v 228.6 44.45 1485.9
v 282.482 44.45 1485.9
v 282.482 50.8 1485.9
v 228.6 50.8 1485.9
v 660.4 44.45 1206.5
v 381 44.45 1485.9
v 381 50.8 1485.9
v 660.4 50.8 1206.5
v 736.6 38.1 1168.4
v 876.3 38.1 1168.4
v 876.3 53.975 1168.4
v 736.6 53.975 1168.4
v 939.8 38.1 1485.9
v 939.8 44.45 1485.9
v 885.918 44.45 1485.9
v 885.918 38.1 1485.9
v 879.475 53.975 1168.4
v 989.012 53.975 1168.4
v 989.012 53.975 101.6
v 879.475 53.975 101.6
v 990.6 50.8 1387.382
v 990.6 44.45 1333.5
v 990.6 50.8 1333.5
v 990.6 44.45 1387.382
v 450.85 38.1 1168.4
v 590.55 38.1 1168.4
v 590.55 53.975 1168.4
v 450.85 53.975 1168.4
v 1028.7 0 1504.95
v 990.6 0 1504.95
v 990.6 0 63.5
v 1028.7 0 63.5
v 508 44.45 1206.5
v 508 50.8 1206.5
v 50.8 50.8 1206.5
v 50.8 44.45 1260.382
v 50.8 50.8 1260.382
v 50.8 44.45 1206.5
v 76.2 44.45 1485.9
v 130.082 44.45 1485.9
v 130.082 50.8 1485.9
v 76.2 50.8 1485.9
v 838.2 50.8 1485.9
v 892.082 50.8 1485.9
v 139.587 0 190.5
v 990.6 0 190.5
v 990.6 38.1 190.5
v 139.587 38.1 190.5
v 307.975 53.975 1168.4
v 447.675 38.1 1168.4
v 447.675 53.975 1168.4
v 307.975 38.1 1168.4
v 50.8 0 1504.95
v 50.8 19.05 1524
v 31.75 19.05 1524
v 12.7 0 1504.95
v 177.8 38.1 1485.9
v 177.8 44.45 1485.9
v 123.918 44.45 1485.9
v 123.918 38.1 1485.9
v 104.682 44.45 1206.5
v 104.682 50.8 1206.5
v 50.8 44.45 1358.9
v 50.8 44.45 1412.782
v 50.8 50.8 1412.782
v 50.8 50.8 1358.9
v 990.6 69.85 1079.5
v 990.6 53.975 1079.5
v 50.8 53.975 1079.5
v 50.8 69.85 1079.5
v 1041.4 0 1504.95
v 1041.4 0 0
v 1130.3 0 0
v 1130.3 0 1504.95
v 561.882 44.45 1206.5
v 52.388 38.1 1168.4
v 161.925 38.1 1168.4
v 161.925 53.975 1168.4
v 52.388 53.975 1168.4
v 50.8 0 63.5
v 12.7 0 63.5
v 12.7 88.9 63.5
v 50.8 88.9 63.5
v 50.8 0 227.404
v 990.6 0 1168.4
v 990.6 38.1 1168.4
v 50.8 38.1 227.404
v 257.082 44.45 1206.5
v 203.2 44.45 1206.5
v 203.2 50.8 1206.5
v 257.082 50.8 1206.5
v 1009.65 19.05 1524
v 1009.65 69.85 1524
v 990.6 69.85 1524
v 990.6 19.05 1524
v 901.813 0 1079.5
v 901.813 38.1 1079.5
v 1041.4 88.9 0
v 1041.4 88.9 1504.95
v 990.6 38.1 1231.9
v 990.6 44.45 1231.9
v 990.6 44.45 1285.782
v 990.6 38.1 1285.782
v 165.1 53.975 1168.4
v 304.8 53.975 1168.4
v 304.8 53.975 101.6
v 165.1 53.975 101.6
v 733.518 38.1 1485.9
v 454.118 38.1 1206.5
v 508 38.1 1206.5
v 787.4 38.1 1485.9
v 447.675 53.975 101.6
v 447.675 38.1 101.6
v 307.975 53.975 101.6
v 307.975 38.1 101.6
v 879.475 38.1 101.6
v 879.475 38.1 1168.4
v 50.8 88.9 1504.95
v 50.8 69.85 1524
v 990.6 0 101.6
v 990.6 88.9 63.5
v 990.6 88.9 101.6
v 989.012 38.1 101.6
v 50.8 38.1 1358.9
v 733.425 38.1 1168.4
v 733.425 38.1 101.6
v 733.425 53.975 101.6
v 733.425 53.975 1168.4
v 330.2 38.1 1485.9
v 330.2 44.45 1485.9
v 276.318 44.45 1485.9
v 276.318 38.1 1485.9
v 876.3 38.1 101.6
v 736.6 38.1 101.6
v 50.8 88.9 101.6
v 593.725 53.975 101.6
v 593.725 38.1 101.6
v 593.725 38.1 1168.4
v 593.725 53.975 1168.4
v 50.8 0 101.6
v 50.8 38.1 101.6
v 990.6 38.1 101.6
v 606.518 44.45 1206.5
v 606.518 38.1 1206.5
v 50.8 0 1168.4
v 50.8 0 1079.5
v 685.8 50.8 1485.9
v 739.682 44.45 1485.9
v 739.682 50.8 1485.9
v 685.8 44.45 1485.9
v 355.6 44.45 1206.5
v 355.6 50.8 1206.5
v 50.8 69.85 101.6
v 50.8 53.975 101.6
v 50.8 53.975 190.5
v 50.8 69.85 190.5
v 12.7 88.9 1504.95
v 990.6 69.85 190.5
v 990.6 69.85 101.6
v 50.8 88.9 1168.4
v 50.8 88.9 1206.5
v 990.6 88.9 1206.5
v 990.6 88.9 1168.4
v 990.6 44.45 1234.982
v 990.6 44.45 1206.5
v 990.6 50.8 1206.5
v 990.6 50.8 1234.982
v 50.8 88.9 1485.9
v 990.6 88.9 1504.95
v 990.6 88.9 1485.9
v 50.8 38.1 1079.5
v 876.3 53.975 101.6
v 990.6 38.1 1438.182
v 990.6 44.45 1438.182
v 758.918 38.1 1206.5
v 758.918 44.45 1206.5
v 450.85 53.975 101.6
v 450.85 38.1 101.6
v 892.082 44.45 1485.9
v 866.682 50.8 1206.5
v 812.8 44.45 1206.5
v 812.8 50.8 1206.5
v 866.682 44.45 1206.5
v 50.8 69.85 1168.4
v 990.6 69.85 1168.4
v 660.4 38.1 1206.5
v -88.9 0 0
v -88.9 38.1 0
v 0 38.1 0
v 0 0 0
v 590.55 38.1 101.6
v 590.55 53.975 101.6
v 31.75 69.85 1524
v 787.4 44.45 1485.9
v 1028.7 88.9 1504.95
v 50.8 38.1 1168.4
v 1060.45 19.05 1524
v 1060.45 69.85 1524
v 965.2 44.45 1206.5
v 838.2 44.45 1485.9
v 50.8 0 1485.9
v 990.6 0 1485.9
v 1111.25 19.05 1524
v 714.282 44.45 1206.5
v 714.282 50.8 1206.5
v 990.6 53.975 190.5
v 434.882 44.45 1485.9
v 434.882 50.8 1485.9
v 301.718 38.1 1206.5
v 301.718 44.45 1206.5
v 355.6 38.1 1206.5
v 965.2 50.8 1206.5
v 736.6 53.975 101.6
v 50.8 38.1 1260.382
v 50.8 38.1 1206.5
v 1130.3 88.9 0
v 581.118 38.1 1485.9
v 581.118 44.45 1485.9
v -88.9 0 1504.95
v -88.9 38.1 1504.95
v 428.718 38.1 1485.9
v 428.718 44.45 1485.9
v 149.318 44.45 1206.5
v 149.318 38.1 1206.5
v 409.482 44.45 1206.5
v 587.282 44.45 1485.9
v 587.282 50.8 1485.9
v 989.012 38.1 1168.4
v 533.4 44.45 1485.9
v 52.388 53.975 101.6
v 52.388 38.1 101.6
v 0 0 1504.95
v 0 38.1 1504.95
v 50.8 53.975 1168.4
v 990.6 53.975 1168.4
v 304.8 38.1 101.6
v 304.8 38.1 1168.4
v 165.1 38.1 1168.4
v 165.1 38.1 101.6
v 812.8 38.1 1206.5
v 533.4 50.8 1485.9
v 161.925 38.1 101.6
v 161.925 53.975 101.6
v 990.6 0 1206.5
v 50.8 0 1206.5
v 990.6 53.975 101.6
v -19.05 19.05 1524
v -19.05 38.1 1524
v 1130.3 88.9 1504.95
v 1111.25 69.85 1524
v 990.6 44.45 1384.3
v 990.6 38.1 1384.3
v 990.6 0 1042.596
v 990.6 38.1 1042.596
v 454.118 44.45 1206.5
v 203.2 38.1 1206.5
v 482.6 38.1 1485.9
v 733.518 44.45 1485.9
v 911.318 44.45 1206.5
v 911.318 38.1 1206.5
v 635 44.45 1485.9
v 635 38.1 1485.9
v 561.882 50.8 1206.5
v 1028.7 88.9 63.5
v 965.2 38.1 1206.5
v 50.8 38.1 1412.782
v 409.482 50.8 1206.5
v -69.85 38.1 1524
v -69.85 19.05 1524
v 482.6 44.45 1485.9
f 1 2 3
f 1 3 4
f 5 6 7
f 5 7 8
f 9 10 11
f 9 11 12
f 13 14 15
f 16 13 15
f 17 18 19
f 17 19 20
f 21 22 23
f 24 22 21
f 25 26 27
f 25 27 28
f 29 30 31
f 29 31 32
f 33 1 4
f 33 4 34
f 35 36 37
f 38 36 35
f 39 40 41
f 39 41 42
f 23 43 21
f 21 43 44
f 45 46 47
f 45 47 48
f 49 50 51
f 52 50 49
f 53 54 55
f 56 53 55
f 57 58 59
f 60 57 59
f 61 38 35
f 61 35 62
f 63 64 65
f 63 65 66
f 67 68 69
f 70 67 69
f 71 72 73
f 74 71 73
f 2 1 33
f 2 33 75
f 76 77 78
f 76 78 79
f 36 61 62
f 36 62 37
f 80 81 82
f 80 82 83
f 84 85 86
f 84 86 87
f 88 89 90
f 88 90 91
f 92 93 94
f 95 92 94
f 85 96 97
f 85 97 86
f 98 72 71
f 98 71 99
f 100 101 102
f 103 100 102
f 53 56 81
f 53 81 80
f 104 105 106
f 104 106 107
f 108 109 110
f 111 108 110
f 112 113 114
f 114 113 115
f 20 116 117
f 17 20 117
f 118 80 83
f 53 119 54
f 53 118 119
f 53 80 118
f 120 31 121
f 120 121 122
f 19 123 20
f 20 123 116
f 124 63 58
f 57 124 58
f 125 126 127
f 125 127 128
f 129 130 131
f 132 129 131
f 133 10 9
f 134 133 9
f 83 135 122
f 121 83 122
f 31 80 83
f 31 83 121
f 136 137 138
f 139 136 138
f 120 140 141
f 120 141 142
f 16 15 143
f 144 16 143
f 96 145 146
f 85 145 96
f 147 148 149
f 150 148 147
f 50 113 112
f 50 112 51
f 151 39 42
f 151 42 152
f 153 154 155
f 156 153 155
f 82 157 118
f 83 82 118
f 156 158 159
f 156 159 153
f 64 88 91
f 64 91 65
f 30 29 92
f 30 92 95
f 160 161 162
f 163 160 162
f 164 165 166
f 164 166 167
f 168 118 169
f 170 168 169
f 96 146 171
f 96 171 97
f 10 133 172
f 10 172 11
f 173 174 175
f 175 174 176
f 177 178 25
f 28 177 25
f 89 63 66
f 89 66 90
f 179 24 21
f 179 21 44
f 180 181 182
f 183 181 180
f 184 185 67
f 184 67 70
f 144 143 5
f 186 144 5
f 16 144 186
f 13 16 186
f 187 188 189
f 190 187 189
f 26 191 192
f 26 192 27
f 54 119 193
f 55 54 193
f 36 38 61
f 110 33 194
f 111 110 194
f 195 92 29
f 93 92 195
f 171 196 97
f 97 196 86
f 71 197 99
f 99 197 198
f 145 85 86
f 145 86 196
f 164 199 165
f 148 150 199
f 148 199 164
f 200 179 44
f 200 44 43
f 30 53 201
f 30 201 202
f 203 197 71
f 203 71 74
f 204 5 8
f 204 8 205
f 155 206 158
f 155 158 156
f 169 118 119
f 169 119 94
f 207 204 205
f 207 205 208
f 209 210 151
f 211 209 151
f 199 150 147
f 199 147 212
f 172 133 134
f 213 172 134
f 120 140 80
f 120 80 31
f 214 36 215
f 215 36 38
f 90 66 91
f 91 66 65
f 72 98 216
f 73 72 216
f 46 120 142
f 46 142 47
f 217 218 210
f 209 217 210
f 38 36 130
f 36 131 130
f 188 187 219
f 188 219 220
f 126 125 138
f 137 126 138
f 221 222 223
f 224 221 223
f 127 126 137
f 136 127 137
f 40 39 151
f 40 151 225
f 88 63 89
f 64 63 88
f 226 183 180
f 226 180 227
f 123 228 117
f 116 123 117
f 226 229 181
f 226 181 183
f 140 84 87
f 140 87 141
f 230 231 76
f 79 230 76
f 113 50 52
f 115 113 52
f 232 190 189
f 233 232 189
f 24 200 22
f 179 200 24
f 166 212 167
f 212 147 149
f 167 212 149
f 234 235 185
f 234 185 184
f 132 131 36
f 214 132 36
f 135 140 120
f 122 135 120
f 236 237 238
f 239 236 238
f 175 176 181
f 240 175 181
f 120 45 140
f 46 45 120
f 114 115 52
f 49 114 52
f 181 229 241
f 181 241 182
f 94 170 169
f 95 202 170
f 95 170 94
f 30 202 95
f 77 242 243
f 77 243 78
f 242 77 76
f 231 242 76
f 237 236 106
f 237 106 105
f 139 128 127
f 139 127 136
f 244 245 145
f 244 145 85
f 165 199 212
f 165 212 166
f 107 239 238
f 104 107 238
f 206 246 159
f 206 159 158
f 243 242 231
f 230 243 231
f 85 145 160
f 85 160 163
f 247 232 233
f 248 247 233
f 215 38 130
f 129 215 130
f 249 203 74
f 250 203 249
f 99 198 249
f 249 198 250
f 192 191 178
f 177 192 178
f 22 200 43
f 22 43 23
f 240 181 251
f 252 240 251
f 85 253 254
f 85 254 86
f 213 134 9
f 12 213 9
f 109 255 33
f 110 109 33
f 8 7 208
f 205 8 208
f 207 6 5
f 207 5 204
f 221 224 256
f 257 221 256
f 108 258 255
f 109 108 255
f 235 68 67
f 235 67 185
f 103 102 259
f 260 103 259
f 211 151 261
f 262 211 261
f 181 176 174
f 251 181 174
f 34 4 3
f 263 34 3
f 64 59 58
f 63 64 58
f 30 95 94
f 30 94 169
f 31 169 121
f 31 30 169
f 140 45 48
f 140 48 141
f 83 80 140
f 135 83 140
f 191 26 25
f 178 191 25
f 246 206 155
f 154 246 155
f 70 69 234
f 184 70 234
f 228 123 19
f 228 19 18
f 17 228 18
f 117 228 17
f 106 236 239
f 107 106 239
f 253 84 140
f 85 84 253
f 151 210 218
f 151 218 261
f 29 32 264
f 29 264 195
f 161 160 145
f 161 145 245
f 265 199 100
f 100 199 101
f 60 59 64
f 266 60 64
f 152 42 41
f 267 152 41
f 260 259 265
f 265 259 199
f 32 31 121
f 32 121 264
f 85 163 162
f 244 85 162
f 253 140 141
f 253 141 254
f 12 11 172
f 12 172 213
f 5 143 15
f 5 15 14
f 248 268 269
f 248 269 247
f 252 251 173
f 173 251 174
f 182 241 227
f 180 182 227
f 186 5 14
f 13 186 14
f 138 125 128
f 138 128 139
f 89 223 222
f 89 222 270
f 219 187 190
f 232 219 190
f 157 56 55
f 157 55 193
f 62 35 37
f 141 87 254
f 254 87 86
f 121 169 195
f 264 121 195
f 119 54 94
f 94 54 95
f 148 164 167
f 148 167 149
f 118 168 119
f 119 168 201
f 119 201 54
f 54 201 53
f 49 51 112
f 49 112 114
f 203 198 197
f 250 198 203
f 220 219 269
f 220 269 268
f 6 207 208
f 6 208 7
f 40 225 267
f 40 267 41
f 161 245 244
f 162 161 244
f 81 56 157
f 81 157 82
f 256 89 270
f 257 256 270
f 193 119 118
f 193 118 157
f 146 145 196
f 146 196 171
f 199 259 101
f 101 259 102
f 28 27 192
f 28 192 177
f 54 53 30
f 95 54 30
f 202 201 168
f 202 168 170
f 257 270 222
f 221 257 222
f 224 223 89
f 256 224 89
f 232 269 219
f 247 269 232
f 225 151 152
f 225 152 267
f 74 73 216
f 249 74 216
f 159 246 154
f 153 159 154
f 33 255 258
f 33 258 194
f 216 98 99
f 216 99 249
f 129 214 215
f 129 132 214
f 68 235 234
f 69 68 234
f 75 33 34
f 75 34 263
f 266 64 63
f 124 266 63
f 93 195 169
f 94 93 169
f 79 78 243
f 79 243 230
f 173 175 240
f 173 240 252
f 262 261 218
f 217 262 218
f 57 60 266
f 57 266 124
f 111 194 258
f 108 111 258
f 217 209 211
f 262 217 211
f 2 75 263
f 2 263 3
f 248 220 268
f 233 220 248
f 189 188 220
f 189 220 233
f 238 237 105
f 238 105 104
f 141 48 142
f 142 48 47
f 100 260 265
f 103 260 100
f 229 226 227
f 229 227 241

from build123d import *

# Parameters (mm, degrees)
F0_W       = 88.9
F0_H       = 88.9
F1_DEPTH   = 1524
F0_H_2     = 38.1
F3_DEPTH   = 88.9
F4_W       = 939.8
F4_H       = 38.1
F5_DEPTH   = 88.9
F7_DEPTH   = 38.1
F9_DEPTH   = 38.1
F10_W      = 139.7
F10_H      = 1066.8
F11_DEPTH  = 15.875
F10_W_2    = 109.5375
F12_W      = 939.8
F12_H      = 88.9
F13_DEPTH  = 15.875
F16_DEPTH  = 6.35
F18_DEPTH  = 6.35
F19_SIZE   = 19.05
F19_2_SIZE = 19.05
F19_3_SIZE = 19.05
F19_4_SIZE = 19.05
F19_5_SIZE = 19.05


with BuildPart() as f1:
    # F0 (on Top) → F1 (new body)
    with BuildSketch(Plane.XY):
        with Locations((1085.85, 44.45)):
            Rectangle(F0_W, F0_H)
    extrude(amount=F1_DEPTH)

    # F19
    f19_edges = [f1.edges().sort_by_distance(p)[0] for p in [
        (1041.4, 44.45, 1524),
        (1085.85, 0, 1524),
        (1130.3, 44.45, 1524),
        (1085.85, 88.9, 1524),
    ]]
    chamfer(f19_edges, length=F19_SIZE)


with BuildPart() as f1b:
    # F0 (on Top) → F1, piece 2 (new body)
    with BuildSketch(Plane.XY):
        with Locations((-44.45, 19.05)):
            Rectangle(F0_W, F0_H_2)
    extrude(amount=F1_DEPTH)

    # F19#2
    f19_2_edges = [f1b.edges().sort_by_distance(p)[0] for p in [
        (-44.45, 0, 1524),
        (0, 19.05, 1524),
        (-88.9, 19.05, 1524),
    ]]
    chamfer(f19_2_edges, length=F19_2_SIZE)


with BuildPart() as f3:
    # F2 (on face) → F3 (new body)
    with BuildSketch(Plane.XZ):
        Polygon((1028.7, 63.5), (1028.7, 1524), (990.6, 1524), (990.6, 1485.9), (990.6, 1206.5), (990.6, 1168.4), (990.6, 101.6), (990.6, 63.5), align=None)
    extrude(amount=-F3_DEPTH)

    # F19#3
    f19_3_edges = [f3.edges().sort_by_distance(p)[0] for p in [
        (1009.65, 0, 1524),
        (1028.7, 44.45, 1524),
        (1009.65, 88.9, 1524),
    ]]
    chamfer(f19_3_edges, length=F19_3_SIZE)


with BuildPart() as f3b:
    # F2 (on face) → F3, piece 2 (new body)
    with BuildSketch(Plane.XZ):
        Polygon((50.8, 1485.9), (50.8, 1524), (12.7, 1524), (12.7, 63.5), (50.8, 63.5), (50.8, 101.6), (50.8, 1168.4), (50.8, 1206.5), align=None)
    extrude(amount=-F3_DEPTH)

    # F19#4
    f19_4_edges = [f3b.edges().sort_by_distance(p)[0] for p in [
        (31.75, 0, 1524),
        (12.7, 44.45, 1524),
        (31.75, 88.9, 1524),
    ]]
    chamfer(f19_4_edges, length=F19_4_SIZE)


with BuildPart() as f5:
    # F4 (on face) → F5 (new body)
    with BuildSketch(Plane.XZ):
        with Locations((520.7, 1504.95)):
            Rectangle(F4_W, F4_H)
    extrude(amount=-F5_DEPTH)

    # F19#5
    f19_5_edges = [f5.edges().sort_by_distance(p)[0] for p in [
        (520.7, 0, 1524),
        (520.7, 88.9, 1524),
    ]]
    chamfer(f19_5_edges, length=F19_5_SIZE)


with BuildPart() as f5b:
    # F4 (on face) → F5, piece 2 (new body)
    with BuildSketch(Plane.XZ):
        with Locations((520.7, 1187.45)):
            Rectangle(F4_W, F4_H)
    extrude(amount=-F5_DEPTH)


with BuildPart() as f5c:
    # F4 (on face) → F5, piece 3 (new body)
    with BuildSketch(Plane.XZ):
        with Locations((520.7, 82.55)):
            Rectangle(F4_W, F4_H)
    extrude(amount=-F5_DEPTH)


with BuildPart() as f7:
    # F6 (on face) → F7 (new body)
    with BuildSketch(Plane.XZ):
        Polygon((990.6, 1042.596365767), (990.6, 1168.4), (50.8, 227.403634233), (50.8, 101.6), align=None)
    extrude(amount=-F7_DEPTH)


with BuildPart() as f9:
    # F8 (on face) → F9 (new body)
    with BuildSketch(Plane.XZ):
        Polygon((990.6, 1168.4), (50.8, 1168.4), (50.8, 1079.5), (901.8130258528, 1079.5), align=None)
    extrude(amount=-F9_DEPTH)


with BuildPart() as f9b:
    # F8 (on face) → F9, piece 2 (new body)
    with BuildSketch(Plane.XZ):
        Polygon((50.8, 101.6), (990.6, 101.6), (990.6, 190.5), (139.5869741472, 190.5), align=None)
    extrude(amount=-F9_DEPTH)


with BuildPart() as f11:
    # F10 (on face) → F11 (new body)
    with BuildSketch(Plane(origin=(0, 38.1, 0), x_dir=(-1, 0, 0), z_dir=(0, 1, 0))):
        with Locations((-520.7, 635)):
            Rectangle(F10_W, F10_H)
    extrude(amount=F11_DEPTH)


with BuildPart() as f11b:
    # F10 (on face) → F11, piece 2 (new body)
    with BuildSketch(Plane(origin=(0, 38.1, 0), x_dir=(-1, 0, 0), z_dir=(0, 1, 0))):
        with Locations((-377.825, 635)):
            Rectangle(F10_W, F10_H)
    extrude(amount=F11_DEPTH)


with BuildPart() as f11c:
    # F10 (on face) → F11, piece 3 (new body)
    with BuildSketch(Plane(origin=(0, 38.1, 0), x_dir=(-1, 0, 0), z_dir=(0, 1, 0))):
        with Locations((-234.95, 635)):
            Rectangle(F10_W, F10_H)
    extrude(amount=F11_DEPTH)


with BuildPart() as f11d:
    # F10 (on face) → F11, piece 4 (new body)
    with BuildSketch(Plane(origin=(0, 38.1, 0), x_dir=(-1, 0, 0), z_dir=(0, 1, 0))):
        with Locations((-107.15625, 635)):
            Rectangle(F10_W_2, F10_H)
    extrude(amount=F11_DEPTH)


with BuildPart() as f11e:
    # F10 (on face) → F11, piece 5 (new body)
    with BuildSketch(Plane(origin=(0, 38.1, 0), x_dir=(-1, 0, 0), z_dir=(0, 1, 0))):
        with Locations((-806.45, 635)):
            Rectangle(F10_W, F10_H)
    extrude(amount=F11_DEPTH)


with BuildPart() as f11f:
    # F10 (on face) → F11, piece 6 (new body)
    with BuildSketch(Plane(origin=(0, 38.1, 0), x_dir=(-1, 0, 0), z_dir=(0, 1, 0))):
        with Locations((-934.24375, 635)):
            Rectangle(F10_W_2, F10_H)
    extrude(amount=F11_DEPTH)


with BuildPart() as f11g:
    # F10 (on face) → F11, piece 7 (new body)
    with BuildSketch(Plane(origin=(0, 38.1, 0), x_dir=(-1, 0, 0), z_dir=(0, 1, 0))):
        with Locations((-663.575, 635)):
            Rectangle(F10_W, F10_H)
    extrude(amount=F11_DEPTH)


with BuildPart() as f13:
    # F12 (on face) → F13 (new body)
    with BuildSketch(Plane(origin=(0, 53.975, 0), x_dir=(-1, 0, 0), z_dir=(0, 1, 0))):
        with Locations((-520.7, 1123.95)):
            Rectangle(F12_W, F12_H)
    extrude(amount=F13_DEPTH)


with BuildPart() as f13b:
    # F12 (on face) → F13, piece 2 (new body)
    with BuildSketch(Plane(origin=(0, 53.975, 0), x_dir=(-1, 0, 0), z_dir=(0, 1, 0))):
        with Locations((-520.7, 146.05)):
            Rectangle(F12_W, F12_H)
    extrude(amount=F13_DEPTH)


with BuildPart() as f16:
    # F15 (on offset) → F16 (new body)
    with BuildSketch(Plane.XZ.offset(-44.45)):
        Polygon((177.8, 1485.9), (123.9184632736, 1485.9), (50.8, 1412.7815367264), (50.8, 1358.9), align=None)
    extrude(amount=F16_DEPTH)


with BuildPart() as f16b:
    # F15 (on offset) → F16, piece 2 (new body)
    with BuildSketch(Plane.XZ.offset(-44.45)):
        Polygon((990.6, 1384.3), (990.6, 1438.1815367264), (758.9184632736, 1206.5), (812.8, 1206.5), align=None)
    extrude(amount=F16_DEPTH)


with BuildPart() as f16c:
    # F15 (on offset) → F16, piece 3 (new body)
    with BuildSketch(Plane.XZ.offset(-44.45)):
        Polygon((50.8, 1260.3815367264), (50.8, 1206.5), (330.2, 1485.9), (276.3184632736, 1485.9), align=None)
    extrude(amount=F16_DEPTH)


with BuildPart() as f16d:
    # F15 (on offset) → F16, piece 4 (new body)
    with BuildSketch(Plane.XZ.offset(-44.45)):
        Polygon((149.3184632736, 1206.5), (203.2, 1206.5), (482.6, 1485.9), (428.7184632736, 1485.9), align=None)
    extrude(amount=F16_DEPTH)


with BuildPart() as f16e:
    # F15 (on offset) → F16, piece 5 (new body)
    with BuildSketch(Plane.XZ.offset(-44.45)):
        Polygon((301.7184632736, 1206.5), (355.6, 1206.5), (635, 1485.9), (581.1184632736, 1485.9), align=None)
    extrude(amount=F16_DEPTH)


with BuildPart() as f16f:
    # F15 (on offset) → F16, piece 6 (new body)
    with BuildSketch(Plane.XZ.offset(-44.45)):
        Polygon((454.1184632736, 1206.5), (508, 1206.5), (787.4, 1485.9), (733.5184632736, 1485.9), align=None)
    extrude(amount=F16_DEPTH)


with BuildPart() as f16g:
    # F15 (on offset) → F16, piece 7 (new body)
    with BuildSketch(Plane.XZ.offset(-44.45)):
        Polygon((606.5184632736, 1206.5), (660.4, 1206.5), (939.8, 1485.9), (885.9184632736, 1485.9), align=None)
    extrude(amount=F16_DEPTH)


with BuildPart() as f16h:
    # F15 (on offset) → F16, piece 8 (new body)
    with BuildSketch(Plane.XZ.offset(-44.45)):
        Polygon((911.3184632736, 1206.5), (965.2, 1206.5), (990.6, 1231.9), (990.6, 1285.7815367264), align=None)
    extrude(amount=F16_DEPTH)


with BuildPart() as f18:
    # F17 (on offset) → F18 (new body)
    with BuildSketch(Plane.XZ.offset(-44.45)):
        Polygon((104.6815367264, 1206.5), (50.8, 1260.3815367264), (50.8, 1206.5), align=None)
    extrude(amount=-F18_DEPTH)


with BuildPart() as f18b:
    # F17 (on offset) → F18, piece 2 (new body)
    with BuildSketch(Plane.XZ.offset(-44.45)):
        Polygon((257.0815367264, 1206.5), (50.8, 1412.7815367264), (50.8, 1358.9), (203.2, 1206.5), align=None)
    extrude(amount=-F18_DEPTH)


with BuildPart() as f18c:
    # F17 (on offset) → F18, piece 3 (new body)
    with BuildSketch(Plane.XZ.offset(-44.45)):
        Polygon((409.4815367264, 1206.5), (130.0815367264, 1485.9), (76.2, 1485.9), (355.6, 1206.5), align=None)
    extrude(amount=-F18_DEPTH)


with BuildPart() as f18d:
    # F17 (on offset) → F18, piece 4 (new body)
    with BuildSketch(Plane.XZ.offset(-44.45)):
        Polygon((561.8815367264, 1206.5), (282.4815367264, 1485.9), (228.6, 1485.9), (508, 1206.5), align=None)
    extrude(amount=-F18_DEPTH)


with BuildPart() as f18e:
    # F17 (on offset) → F18, piece 5 (new body)
    with BuildSketch(Plane.XZ.offset(-44.45)):
        Polygon((714.2815367264, 1206.5), (434.8815367264, 1485.9), (381, 1485.9), (660.4, 1206.5), align=None)
    extrude(amount=-F18_DEPTH)


with BuildPart() as f18f:
    # F17 (on offset) → F18, piece 6 (new body)
    with BuildSketch(Plane.XZ.offset(-44.45)):
        Polygon((866.6815367264, 1206.5), (587.2815367264, 1485.9), (533.4, 1485.9), (812.8, 1206.5), align=None)
    extrude(amount=-F18_DEPTH)


with BuildPart() as f18g:
    # F17 (on offset) → F18, piece 7 (new body)
    with BuildSketch(Plane.XZ.offset(-44.45)):
        Polygon((990.6, 1234.9815367264), (739.6815367264, 1485.9), (685.8, 1485.9), (965.2, 1206.5), (990.6, 1206.5), align=None)
    extrude(amount=-F18_DEPTH)


with BuildPart() as f18h:
    # F17 (on offset) → F18, piece 8 (new body)
    with BuildSketch(Plane.XZ.offset(-44.45)):
        Polygon((990.6, 1387.3815367264), (892.0815367264, 1485.9), (838.2, 1485.9), (990.6, 1333.5), align=None)
    extrude(amount=-F18_DEPTH)


solid = Compound([f1.part, f1b.part, f3.part, f3b.part, f5.part, f5b.part, f5c.part, f7.part, f9.part, f9b.part, f11.part, f11b.part, f11c.part, f11d.part, f11e.part, f11f.part, f11g.part, f13.part, f13b.part, f16.part, f16b.part, f16c.part, f16d.part, f16e.part, f16f.part, f16g.part, f16h.part, f18.part, f18b.part, f18c.part, f18d.part, f18e.part, f18f.part, f18g.part, f18h.part])
